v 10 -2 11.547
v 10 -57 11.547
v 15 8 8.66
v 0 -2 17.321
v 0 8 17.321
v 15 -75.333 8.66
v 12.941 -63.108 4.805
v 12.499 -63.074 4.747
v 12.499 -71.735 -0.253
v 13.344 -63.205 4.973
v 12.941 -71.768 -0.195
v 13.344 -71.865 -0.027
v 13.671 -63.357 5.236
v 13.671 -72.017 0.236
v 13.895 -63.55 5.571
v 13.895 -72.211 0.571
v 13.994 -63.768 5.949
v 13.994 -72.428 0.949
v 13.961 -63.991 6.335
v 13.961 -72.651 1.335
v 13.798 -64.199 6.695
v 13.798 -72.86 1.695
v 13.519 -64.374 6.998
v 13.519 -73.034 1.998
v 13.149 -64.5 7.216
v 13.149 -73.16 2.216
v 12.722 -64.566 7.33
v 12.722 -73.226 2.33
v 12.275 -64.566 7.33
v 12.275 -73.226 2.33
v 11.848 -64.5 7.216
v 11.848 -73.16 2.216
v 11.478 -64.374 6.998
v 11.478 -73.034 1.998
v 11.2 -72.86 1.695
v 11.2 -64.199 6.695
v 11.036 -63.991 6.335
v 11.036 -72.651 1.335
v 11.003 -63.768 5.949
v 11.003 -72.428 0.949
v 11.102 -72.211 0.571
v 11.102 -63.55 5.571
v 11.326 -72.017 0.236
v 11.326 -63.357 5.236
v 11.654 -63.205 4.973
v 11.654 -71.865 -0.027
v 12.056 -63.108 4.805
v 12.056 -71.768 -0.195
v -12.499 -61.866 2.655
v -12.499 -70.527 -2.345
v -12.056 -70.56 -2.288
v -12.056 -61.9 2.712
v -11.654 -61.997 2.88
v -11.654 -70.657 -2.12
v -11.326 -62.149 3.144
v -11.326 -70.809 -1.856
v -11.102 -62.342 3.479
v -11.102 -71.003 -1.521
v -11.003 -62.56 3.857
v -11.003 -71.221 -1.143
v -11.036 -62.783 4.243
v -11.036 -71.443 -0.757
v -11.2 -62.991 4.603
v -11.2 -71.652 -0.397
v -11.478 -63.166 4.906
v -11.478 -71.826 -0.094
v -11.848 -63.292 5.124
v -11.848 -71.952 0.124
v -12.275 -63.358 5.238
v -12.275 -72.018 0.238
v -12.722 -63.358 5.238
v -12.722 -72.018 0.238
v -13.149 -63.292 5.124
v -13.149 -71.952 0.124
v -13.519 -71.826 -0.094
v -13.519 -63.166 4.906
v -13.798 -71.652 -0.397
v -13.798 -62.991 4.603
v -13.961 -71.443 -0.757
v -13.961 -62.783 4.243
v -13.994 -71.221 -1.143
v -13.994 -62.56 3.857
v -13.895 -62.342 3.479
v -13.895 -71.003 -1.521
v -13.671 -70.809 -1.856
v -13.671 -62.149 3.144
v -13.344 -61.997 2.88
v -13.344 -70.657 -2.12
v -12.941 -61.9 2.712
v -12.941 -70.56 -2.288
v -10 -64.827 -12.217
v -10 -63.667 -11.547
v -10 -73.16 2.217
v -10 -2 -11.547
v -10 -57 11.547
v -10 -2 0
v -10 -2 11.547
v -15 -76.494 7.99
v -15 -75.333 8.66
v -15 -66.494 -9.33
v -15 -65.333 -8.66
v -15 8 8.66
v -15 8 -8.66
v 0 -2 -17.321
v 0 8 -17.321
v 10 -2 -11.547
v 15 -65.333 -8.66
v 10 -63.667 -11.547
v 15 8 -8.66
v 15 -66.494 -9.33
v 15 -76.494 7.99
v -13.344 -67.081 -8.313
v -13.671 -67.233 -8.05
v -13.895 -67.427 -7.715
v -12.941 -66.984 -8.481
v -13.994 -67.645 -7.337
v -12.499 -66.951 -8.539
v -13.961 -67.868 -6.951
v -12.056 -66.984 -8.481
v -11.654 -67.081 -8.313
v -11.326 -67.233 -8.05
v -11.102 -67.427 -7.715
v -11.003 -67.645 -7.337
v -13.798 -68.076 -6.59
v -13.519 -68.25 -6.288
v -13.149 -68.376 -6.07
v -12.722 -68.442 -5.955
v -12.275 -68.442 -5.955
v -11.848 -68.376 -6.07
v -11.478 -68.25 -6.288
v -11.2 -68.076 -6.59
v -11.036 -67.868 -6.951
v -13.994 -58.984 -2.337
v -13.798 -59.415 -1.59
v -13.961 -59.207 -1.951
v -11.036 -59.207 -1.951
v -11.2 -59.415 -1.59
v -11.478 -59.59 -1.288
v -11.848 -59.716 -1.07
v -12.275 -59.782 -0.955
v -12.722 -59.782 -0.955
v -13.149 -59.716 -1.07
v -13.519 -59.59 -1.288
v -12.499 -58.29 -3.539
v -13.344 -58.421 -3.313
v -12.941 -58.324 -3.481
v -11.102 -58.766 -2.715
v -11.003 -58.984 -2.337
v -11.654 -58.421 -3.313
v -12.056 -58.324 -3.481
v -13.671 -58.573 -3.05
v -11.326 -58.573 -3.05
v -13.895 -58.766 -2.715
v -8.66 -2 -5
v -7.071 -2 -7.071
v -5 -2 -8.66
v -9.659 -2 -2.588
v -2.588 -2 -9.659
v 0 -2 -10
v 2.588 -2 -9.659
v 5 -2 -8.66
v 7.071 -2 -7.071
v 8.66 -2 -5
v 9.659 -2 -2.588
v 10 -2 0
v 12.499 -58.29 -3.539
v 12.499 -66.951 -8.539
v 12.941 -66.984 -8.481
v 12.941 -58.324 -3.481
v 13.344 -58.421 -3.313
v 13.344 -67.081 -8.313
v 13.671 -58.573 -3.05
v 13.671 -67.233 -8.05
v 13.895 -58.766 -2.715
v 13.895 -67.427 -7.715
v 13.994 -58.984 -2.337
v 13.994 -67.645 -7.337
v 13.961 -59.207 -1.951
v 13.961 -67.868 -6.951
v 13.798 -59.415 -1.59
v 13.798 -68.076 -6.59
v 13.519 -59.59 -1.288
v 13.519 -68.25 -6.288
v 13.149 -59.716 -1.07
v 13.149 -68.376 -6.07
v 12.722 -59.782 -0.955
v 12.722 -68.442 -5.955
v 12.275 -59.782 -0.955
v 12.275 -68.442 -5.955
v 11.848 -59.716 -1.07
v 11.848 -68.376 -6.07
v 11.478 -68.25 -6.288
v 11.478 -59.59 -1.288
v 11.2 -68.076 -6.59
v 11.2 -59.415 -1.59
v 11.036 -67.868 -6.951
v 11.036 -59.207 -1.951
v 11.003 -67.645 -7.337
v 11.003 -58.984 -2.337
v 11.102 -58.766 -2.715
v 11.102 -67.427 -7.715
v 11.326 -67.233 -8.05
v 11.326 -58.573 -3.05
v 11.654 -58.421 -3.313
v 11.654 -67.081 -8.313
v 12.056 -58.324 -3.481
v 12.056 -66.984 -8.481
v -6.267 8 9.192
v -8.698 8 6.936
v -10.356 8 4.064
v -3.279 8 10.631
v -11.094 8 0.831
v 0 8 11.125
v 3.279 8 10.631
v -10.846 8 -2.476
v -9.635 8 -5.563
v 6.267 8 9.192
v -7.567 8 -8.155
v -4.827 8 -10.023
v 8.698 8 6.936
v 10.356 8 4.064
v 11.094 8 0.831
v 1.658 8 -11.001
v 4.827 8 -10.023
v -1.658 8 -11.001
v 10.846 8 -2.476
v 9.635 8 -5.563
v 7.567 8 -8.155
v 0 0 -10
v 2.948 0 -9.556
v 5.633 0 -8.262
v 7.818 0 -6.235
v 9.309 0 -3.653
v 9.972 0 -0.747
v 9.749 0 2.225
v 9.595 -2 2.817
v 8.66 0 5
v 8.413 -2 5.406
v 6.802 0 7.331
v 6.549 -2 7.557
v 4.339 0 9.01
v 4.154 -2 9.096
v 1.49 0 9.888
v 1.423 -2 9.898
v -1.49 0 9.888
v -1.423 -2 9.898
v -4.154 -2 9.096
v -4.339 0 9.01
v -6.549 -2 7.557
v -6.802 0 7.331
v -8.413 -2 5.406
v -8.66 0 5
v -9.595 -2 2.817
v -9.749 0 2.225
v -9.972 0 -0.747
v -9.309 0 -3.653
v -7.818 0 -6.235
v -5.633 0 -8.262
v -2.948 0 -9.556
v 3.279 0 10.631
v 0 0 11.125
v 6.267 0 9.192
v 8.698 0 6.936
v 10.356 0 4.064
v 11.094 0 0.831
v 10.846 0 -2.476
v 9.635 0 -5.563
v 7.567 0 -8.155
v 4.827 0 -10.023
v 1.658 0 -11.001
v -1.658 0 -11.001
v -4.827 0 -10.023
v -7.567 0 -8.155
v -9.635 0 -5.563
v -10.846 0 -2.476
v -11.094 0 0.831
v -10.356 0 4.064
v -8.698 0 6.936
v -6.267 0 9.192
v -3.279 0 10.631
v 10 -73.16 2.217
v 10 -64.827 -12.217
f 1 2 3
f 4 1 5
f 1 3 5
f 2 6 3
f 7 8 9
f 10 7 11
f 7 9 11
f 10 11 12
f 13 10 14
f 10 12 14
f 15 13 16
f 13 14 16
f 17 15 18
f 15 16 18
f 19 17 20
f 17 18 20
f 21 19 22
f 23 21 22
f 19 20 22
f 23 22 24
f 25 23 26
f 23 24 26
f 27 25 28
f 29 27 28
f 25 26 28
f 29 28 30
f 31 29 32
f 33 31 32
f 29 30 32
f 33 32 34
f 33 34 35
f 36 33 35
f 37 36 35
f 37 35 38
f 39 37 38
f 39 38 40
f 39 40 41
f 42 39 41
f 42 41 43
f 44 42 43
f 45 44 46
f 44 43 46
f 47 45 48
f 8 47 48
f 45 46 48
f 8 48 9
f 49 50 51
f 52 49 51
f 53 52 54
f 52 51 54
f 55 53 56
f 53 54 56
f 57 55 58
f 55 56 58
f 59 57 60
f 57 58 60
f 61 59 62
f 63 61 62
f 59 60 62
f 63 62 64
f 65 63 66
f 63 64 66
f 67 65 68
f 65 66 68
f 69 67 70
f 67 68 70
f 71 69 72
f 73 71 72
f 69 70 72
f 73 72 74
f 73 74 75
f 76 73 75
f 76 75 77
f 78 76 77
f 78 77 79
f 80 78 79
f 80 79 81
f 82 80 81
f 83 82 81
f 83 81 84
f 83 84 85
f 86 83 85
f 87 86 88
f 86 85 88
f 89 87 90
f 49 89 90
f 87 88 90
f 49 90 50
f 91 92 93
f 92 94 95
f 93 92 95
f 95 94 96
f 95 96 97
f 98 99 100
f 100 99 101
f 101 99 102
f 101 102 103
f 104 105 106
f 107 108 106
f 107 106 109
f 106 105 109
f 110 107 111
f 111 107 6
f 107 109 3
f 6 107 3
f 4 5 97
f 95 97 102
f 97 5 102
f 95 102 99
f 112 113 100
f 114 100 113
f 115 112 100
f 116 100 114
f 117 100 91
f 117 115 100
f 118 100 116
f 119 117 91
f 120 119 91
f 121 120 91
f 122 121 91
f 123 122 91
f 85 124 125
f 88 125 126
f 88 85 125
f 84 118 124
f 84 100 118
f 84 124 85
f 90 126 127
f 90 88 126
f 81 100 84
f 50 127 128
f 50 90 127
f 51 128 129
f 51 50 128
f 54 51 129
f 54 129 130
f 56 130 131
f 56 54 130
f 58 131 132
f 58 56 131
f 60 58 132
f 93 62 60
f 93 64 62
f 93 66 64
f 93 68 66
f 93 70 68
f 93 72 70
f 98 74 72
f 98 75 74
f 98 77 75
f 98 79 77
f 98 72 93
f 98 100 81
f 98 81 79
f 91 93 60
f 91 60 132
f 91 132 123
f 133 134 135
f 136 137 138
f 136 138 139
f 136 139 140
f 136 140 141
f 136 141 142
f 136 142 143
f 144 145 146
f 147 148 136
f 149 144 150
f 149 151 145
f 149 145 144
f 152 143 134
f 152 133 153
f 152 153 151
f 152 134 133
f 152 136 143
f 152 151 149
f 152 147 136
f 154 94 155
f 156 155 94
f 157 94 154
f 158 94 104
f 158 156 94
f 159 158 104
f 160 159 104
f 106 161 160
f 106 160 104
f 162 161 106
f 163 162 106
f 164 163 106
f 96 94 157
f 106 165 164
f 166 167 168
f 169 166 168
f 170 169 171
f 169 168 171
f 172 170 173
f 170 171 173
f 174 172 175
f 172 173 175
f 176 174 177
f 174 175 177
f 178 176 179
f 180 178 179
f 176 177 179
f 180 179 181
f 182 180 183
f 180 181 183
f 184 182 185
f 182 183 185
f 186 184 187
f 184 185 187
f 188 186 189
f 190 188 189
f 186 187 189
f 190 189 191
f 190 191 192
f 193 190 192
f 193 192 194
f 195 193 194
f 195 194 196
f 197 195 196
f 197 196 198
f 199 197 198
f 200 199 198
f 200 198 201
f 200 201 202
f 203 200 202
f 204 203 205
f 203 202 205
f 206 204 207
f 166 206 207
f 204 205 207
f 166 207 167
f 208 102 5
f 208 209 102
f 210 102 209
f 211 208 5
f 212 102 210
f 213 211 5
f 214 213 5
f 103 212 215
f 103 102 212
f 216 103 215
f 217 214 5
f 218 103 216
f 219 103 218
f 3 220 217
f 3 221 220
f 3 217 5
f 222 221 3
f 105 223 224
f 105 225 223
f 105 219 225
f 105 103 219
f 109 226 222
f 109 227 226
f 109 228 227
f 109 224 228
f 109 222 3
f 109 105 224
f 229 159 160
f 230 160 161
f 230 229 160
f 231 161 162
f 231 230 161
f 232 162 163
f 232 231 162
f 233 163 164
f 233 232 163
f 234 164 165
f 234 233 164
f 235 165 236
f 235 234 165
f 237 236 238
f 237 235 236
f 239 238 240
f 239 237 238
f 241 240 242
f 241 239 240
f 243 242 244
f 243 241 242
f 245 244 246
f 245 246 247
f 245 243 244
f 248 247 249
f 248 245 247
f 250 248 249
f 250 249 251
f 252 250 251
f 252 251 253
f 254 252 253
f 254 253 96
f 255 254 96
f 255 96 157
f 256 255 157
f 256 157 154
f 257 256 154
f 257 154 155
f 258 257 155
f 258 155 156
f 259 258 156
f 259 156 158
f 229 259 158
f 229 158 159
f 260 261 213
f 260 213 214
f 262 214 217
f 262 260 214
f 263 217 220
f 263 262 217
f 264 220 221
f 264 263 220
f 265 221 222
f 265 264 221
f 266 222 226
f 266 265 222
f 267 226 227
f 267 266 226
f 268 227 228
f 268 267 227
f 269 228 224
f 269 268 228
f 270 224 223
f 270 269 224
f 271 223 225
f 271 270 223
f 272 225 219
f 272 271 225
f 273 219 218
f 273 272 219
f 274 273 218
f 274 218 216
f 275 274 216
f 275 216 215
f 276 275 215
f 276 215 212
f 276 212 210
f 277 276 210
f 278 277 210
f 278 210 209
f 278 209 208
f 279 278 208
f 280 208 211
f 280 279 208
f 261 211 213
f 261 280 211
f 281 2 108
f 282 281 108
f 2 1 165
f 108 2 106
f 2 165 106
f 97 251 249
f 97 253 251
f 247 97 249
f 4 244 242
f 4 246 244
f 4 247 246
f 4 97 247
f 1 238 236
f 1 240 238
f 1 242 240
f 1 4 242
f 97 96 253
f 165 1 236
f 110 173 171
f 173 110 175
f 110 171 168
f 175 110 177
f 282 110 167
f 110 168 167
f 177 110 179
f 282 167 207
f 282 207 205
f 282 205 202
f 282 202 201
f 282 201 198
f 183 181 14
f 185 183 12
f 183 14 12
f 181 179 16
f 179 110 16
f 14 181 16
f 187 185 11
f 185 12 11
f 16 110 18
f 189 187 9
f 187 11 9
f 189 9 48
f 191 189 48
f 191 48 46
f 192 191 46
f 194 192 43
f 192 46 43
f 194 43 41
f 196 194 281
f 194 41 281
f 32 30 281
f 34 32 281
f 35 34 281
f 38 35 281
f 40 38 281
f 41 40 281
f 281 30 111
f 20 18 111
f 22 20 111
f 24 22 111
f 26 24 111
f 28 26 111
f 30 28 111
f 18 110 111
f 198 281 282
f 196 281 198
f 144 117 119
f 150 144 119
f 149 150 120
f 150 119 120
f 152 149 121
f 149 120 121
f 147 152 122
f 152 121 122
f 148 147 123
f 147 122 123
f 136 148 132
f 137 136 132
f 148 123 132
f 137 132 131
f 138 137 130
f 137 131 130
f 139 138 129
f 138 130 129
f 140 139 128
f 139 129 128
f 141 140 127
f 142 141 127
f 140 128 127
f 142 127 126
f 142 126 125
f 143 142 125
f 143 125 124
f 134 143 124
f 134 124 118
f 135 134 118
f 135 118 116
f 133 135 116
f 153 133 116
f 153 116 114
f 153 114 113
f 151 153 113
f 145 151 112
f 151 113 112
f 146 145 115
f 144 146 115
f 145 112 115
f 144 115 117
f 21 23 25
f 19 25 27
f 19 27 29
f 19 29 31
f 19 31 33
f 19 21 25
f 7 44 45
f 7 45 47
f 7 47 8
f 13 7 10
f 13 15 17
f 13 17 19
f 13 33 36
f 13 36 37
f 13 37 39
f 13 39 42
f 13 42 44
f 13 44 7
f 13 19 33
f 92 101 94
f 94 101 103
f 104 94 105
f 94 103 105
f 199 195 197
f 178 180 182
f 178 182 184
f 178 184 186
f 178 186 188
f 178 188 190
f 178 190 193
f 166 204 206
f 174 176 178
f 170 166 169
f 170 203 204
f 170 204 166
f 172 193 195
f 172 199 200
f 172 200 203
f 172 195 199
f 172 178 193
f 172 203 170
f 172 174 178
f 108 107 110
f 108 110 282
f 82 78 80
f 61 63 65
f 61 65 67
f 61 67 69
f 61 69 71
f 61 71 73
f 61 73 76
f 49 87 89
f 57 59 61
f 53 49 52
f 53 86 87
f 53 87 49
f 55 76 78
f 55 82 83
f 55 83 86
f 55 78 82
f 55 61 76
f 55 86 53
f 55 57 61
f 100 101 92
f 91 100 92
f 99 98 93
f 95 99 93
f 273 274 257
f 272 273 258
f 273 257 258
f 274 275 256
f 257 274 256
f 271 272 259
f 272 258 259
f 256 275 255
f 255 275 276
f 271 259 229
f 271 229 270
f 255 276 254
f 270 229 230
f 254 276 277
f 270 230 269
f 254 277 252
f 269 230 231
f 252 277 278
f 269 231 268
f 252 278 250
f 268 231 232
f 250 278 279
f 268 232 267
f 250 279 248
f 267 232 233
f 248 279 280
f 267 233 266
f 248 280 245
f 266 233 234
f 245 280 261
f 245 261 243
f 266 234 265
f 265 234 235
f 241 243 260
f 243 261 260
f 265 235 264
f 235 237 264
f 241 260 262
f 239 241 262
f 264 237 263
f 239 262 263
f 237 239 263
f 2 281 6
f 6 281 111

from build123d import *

# Parameters (mm, degrees)
SKETCH2_R           = 11.125
BOSS_EXTRUDE1_DEPTH = 8
SKETCH3_R           = 10
BOSS_EXTRUDE2_DEPTH = 2
BOSS_EXTRUDE3_DEPTH = 75
CUT_EXTRUDE1_DEPTH  = 85.433405711
BOSS_EXTRUDE4_DEPTH = 1.34
CUT_EXTRUDE4_DEPTH  = 81.030594237
SKETCH14_R          = 1.5
CUT_EXTRUDE6_DEPTH  = 10


with BuildPart() as part:
    # Sketch2 → Boss-Extrude1 (new body)
    with BuildSketch(Plane(origin=(0, 0, 0), x_dir=(1, 0, 0), z_dir=(0, 1, 0))):
        Polygon((0, 17.320508076), (-15, 8.660254038), (-15, -8.660254038), (0, -17.320508076), (15, -8.660254038), (15, 8.660254038), align=None)
        with Locations(Location((0, 0, 0), (0, 0, 270))):
            Circle(SKETCH2_R, mode=Mode.SUBTRACT)
    extrude(amount=BOSS_EXTRUDE1_DEPTH)

    # Sketch3 → Boss-Extrude2 (add)
    with BuildSketch(Plane.XZ):
        Polygon((0, 17.320508076), (-15, 8.660254038), (-15, -8.660254038), (0, -17.320508076), (15, -8.660254038), (15, 8.660254038), align=None)
        with Locations(Location((0, 0, 0), (0, 0, 270))):
            Circle(SKETCH3_R, mode=Mode.SUBTRACT)
    extrude(amount=BOSS_EXTRUDE2_DEPTH)

    # Sketch4 → Boss-Extrude3 (add)
    with BuildSketch(Plane.XZ.offset(2)):
        Polygon((-10, 11.547005384), (-15, 8.660254038), (-15, -8.660254038), (-10, -11.547005384), align=None)
        Polygon((10, -11.547005384), (15, -8.660254038), (15, 8.660254038), (10, 11.547005384), align=None)
    extrude(amount=BOSS_EXTRUDE3_DEPTH)

    # Sketch5 → Cut-Extrude1 (cut, through all)
    with BuildSketch(Plane.ZY.offset(15)):
        Polygon((11.547005384, -77), (-11.547005384, -63.666666667), (-11.547005384, -77), align=None)
    extrude(amount=-CUT_EXTRUDE1_DEPTH, mode=Mode.SUBTRACT)

    # Sketch6 → Boss-Extrude4 (add)
    with BuildSketch(Plane(origin=(0, -52.75, -30.4552267), x_dir=(1, 0, 0), z_dir=(-1.6525460586108427e-15, -0.8660254037844438, -0.4999999999999913))):
        Polygon((-10, 48.5), (-15, 45.166666667), (-15, 25.166666667), (-10, 21.833333333), align=None)
        Polygon((10, 48.5), (15, 45.166666667), (15, 25.166666667), (10, 21.833333333), align=None)
    extrude(amount=BOSS_EXTRUDE4_DEPTH)

    # Sketch9 → Cut-Extrude4 (cut, through all)
    with BuildSketch(Plane(origin=(0, -53.910474041, -31.1252267), x_dir=(1, 0, 0), z_dir=(0, -0.8660254037844435, -0.4999999999999916))):
        Polygon((-15, 45.166666667), (-10, 38.5), (-10, 48.5), align=None)
        Polygon((10, 48.5), (10, 38.5), (15, 45.166666667), align=None)
    extrude(amount=-CUT_EXTRUDE4_DEPTH, mode=Mode.SUBTRACT)

    # Sketch14 → Cut-Extrude6 (cut)
    with BuildSketch(Plane(origin=(0, -53.910474041, -31.1252267), x_dir=(1, 0, 0), z_dir=(-3.0355825822191097e-15, -0.8660254037844435, -0.4999999999999916))):
        with Locations(Location((-12.498602075, 34.732241333, 0), (0, 0, 270))):
            Circle(SKETCH14_R)
        with Locations(Location((-12.498602075, 27.580286063, 0), (0, 0, 270))):
            Circle(SKETCH14_R)
        with Locations(Location((12.498602075, 27.580286063, 0), (0, 0, 270))):
            Circle(SKETCH14_R)
        with Locations(Location((12.498602075, 37.148097384, 0), (0, 0, 270))):
            Circle(SKETCH14_R)
    extrude(amount=-CUT_EXTRUDE6_DEPTH, mode=Mode.SUBTRACT)


solid = part.part
